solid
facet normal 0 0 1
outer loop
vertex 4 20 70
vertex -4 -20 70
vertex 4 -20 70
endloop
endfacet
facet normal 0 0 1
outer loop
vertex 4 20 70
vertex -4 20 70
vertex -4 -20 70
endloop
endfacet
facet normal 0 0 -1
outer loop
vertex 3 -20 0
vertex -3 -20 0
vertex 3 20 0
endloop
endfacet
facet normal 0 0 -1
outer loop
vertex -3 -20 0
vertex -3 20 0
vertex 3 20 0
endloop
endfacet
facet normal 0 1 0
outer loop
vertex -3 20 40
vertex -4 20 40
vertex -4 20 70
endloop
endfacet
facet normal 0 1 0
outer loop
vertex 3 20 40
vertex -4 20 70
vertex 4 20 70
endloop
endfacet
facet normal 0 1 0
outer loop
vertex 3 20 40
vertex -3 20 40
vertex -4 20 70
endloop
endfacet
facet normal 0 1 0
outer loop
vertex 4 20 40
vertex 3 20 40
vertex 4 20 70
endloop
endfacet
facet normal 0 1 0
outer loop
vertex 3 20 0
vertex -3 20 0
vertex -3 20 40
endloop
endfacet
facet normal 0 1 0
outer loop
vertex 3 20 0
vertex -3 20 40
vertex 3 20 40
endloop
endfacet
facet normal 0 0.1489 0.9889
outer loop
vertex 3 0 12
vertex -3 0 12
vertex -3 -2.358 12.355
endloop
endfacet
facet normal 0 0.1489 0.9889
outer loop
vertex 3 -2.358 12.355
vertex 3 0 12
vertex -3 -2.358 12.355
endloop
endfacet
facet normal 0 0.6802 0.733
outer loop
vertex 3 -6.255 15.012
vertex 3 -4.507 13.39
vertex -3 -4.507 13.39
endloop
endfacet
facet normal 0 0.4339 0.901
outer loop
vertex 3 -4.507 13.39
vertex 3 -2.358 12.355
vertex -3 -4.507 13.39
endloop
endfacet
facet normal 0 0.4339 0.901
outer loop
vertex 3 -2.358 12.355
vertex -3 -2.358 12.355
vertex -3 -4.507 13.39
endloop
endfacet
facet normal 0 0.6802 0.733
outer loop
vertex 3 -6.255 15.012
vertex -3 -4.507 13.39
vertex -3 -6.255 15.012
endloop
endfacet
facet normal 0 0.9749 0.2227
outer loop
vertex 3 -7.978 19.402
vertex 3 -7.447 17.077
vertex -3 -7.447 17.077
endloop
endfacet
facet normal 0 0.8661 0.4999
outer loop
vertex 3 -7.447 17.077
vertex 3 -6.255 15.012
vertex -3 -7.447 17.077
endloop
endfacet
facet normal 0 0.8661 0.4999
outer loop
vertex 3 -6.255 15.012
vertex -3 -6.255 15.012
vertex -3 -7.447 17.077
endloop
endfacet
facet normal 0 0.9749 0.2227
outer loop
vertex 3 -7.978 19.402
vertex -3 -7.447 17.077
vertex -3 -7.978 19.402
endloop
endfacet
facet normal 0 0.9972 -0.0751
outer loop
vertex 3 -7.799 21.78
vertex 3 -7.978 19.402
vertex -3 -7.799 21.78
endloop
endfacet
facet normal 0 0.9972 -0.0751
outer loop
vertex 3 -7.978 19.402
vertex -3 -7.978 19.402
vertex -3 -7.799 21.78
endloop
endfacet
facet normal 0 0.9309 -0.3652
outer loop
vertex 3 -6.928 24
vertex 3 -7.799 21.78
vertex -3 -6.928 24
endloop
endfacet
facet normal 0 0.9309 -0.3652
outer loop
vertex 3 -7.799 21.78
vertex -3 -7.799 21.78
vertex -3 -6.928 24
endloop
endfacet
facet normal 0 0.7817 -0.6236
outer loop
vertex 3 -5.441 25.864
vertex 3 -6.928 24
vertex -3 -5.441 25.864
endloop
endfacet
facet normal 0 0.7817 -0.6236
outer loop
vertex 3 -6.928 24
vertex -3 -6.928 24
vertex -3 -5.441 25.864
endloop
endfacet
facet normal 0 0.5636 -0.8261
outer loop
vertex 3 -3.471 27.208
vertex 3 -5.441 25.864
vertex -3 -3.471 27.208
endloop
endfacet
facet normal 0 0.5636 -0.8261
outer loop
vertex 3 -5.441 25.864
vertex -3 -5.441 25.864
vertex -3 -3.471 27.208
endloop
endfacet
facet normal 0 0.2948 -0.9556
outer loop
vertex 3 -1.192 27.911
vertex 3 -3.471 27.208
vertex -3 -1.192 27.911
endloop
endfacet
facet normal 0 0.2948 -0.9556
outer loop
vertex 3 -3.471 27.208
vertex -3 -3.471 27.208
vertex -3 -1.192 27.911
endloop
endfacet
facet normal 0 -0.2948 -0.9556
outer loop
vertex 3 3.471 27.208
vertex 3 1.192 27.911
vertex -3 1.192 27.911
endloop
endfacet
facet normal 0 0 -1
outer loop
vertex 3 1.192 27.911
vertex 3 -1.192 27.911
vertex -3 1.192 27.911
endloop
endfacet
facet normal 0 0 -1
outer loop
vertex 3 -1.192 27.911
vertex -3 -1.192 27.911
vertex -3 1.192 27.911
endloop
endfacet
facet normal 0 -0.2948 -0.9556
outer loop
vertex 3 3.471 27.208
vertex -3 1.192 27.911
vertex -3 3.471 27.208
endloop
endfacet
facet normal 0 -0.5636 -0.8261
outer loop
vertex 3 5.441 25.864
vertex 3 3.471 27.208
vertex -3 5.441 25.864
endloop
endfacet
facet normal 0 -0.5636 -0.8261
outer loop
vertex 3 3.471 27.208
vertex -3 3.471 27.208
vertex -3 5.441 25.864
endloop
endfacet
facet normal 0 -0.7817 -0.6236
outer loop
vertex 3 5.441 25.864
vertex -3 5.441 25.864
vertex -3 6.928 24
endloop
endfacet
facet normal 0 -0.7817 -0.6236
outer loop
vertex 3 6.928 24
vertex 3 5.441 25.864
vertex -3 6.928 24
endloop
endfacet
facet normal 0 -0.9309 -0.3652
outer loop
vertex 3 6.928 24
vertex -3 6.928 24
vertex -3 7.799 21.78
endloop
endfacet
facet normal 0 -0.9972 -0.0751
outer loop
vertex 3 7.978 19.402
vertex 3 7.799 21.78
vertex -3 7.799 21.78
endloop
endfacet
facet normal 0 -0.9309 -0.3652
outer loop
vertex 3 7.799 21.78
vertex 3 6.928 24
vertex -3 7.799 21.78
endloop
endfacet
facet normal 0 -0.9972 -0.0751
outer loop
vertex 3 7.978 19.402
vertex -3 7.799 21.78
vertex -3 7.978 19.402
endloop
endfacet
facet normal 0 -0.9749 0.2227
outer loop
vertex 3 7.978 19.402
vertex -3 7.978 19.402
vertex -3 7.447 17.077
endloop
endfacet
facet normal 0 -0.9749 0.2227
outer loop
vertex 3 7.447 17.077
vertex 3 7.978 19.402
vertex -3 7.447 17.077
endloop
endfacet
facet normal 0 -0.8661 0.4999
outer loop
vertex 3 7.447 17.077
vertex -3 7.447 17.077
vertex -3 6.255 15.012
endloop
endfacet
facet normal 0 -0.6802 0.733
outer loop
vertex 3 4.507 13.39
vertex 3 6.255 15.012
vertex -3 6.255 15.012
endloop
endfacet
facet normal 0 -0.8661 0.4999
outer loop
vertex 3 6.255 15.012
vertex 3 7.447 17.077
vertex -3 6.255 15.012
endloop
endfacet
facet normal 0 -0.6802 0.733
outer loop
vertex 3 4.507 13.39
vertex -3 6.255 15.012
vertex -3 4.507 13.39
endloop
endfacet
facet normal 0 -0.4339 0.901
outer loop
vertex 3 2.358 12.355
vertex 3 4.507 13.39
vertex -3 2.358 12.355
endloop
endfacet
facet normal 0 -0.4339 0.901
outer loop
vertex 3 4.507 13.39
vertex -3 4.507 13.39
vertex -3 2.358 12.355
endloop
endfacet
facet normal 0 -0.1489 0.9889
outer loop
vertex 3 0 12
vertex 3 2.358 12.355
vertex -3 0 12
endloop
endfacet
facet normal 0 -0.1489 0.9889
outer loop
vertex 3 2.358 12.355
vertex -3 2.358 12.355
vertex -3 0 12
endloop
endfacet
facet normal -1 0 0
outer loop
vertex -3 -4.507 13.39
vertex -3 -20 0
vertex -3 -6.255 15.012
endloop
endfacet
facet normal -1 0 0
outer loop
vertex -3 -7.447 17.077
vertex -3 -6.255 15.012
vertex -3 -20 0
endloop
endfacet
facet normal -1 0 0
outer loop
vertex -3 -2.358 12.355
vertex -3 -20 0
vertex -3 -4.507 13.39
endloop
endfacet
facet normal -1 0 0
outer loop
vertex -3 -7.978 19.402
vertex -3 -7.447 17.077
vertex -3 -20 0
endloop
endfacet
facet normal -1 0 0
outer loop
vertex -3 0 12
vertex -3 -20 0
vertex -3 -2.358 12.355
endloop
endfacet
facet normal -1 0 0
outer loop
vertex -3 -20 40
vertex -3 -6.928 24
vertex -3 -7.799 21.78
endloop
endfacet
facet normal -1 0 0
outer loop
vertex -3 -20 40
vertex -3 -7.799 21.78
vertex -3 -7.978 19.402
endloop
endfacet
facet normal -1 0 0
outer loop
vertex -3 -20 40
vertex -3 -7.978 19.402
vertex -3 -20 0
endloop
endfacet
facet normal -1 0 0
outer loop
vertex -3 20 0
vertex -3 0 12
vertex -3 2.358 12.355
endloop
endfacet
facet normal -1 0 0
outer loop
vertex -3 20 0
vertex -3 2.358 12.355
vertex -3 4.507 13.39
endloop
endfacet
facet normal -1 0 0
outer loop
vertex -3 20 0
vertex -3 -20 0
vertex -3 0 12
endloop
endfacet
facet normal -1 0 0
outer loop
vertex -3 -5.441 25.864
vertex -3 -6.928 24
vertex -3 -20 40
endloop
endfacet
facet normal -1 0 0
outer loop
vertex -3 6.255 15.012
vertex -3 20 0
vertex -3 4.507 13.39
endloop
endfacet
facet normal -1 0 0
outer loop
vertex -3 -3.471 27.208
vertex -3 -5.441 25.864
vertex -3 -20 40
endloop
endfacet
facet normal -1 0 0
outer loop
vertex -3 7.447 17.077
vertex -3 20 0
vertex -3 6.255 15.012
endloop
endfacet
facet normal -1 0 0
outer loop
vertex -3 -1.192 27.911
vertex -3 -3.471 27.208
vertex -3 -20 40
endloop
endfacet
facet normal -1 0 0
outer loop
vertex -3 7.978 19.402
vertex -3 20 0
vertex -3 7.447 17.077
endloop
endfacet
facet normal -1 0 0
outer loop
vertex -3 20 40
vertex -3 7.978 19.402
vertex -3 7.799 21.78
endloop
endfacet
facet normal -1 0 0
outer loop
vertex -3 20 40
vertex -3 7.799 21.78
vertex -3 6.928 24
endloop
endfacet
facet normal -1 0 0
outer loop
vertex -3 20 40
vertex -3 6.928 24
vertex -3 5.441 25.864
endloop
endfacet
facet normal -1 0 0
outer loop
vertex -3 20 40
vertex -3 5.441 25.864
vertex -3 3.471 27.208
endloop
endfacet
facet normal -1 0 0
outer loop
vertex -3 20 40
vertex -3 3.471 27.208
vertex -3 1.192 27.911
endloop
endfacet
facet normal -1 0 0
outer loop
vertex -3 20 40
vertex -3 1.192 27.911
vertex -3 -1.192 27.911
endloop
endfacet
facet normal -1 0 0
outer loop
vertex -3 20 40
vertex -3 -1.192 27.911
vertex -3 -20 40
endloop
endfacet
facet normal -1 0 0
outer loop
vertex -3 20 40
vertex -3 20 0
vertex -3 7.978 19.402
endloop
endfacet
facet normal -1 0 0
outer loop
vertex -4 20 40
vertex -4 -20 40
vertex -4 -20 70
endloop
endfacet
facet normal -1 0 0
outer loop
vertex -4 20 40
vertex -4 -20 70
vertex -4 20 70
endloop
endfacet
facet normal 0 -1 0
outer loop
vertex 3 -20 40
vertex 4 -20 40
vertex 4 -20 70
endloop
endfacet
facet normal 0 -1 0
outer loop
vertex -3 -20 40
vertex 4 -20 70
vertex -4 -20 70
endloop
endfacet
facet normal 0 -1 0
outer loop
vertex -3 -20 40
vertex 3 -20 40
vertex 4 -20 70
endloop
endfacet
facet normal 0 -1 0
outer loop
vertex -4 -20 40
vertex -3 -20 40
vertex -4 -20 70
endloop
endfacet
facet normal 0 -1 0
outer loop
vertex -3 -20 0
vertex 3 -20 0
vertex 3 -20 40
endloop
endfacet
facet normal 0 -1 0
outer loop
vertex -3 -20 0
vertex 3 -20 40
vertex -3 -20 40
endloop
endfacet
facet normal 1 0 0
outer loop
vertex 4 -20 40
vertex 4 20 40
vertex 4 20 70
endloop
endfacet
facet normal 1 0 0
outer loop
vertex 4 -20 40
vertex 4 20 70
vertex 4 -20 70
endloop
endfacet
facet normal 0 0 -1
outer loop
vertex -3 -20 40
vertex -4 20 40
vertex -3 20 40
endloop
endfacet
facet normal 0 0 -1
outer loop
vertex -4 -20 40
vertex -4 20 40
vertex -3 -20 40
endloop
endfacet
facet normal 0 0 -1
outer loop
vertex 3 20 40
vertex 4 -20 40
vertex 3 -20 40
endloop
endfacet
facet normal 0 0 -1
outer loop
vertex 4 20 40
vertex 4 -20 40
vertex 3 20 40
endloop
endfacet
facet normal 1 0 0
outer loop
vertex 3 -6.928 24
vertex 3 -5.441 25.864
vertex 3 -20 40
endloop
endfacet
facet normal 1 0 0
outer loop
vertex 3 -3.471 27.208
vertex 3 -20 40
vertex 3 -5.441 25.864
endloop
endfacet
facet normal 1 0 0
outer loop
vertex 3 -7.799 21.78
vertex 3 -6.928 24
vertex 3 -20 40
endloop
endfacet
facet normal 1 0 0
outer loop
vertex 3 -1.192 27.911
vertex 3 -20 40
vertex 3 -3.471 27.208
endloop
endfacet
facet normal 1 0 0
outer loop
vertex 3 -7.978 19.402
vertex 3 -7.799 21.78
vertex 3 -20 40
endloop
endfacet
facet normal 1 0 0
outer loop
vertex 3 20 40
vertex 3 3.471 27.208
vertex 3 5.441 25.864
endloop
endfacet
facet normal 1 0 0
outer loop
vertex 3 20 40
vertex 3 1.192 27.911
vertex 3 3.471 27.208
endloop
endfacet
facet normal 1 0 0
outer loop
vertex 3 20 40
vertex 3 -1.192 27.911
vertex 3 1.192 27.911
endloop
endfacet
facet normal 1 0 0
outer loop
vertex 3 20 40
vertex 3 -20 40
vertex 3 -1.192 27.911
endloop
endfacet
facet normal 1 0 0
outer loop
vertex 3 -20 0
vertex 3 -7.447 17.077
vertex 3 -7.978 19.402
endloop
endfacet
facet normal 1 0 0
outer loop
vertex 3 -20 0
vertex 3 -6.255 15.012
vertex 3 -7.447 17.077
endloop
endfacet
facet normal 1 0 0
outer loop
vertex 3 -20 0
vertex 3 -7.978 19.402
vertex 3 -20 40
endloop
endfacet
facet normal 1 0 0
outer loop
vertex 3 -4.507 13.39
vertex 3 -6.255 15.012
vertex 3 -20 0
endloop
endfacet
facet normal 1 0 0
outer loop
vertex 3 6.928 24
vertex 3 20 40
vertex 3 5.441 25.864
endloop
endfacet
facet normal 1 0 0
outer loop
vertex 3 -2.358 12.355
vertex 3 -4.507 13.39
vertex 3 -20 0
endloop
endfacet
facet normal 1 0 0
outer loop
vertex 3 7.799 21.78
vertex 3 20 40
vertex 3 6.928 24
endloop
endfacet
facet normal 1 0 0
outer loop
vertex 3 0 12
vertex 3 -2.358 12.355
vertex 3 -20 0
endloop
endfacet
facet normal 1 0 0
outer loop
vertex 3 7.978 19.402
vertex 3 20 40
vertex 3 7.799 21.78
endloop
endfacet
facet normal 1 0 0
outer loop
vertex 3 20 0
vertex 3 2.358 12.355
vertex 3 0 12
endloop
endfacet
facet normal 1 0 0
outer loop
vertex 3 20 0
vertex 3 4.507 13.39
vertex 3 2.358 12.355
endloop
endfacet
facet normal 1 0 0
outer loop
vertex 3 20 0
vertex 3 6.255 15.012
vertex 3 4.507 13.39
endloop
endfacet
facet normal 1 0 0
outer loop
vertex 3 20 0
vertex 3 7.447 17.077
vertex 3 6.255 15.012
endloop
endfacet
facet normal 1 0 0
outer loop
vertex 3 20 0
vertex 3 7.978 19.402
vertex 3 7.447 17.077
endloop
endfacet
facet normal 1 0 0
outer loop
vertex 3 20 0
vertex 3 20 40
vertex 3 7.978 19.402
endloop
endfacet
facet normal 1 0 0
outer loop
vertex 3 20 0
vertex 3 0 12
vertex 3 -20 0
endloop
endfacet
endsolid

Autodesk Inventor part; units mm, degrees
ref_plane "YZ Plane" through (0, 0, 0) normal (1, 0, 0) x (0, 1, 0)
ref_plane "Startebene" through (0, 0, 0) normal (0, 0, 1) x (1, 0, 0)
ref_plane "Endebene" through (0, 0, 70) normal (0, 0, 1) x (1, 0, 0)
sketch "Skizze" plane through (0, 0, 0) normal (0, 0, 1) x (1, 0, 0)
  line L0 (4, -20) -> (-4, -20)
  line L1 (-4, -20) -> (-4, 20)
  line L2 (-4, 20) -> (4, 20)
  line L3 (4, 20) -> (4, -20)
  line L4 (-6, 0) -> (8, 0) construction
  line L5 (0, -30) -> (0, 40) construction
  line L6 (0, 54) -> (0, -44) construction
  line L7 (-9.2, 0) -> (13.2, 0) construction
  dimension "d0" = 40
  dimension "d1" = 8
  dimension "d4" = 4
  dimension "d5" = 20
extrude "Körper" add sketch "Skizze" along normal up to surface (70 mm away) from surface at 0
sketch "Sketch3" plane through (0, 0, 0) normal (0, 0, 1) x (1, 0, 0)
  line L0 (0, 0) -> (10, 0)
ref_plane "Work Plane3" through (0, 0, 0) normal (0, -1, 0) x (1, 0, 0)
sketch "Sketch4" plane through (0, 0, 0) normal (0, -1, 0) x (1, 0, 0)
  line L0 (-2, 0) -> (12, 0)
  line L1 (-2, 70) -> (12, 70)
  dimension "d9" = 70
sketch "Skizze5" plane through (4, -20, 70) normal (1, 0, 0) x (0, 0, -1)
  line L0 (70, 0) -> (0, 0) projected
  line L1 (70, 40) -> (70, 0) projected
  point P0 (70, 20)
  point P1 (50, 20)
  dimension "d11" = 20
  dimension "d19" = 20
hole "Bohrung1" at (4, 0, 20) direction (-1, 0, 0) diameter 16 depth 15 tip angle 118
sketch "Skizze6" plane through (4, -20, 70) normal (1, 0, 0) x (0, 0, -1)
  circle A0 centre (50, 20) radius 8 projected
  line L0 (70, 40) -> (0, 40) projected
  line L1 (70, 0) -> (30, 0)
  line L2 (30, 0) -> (30, 40)
  line L3 (30, 40) -> (70, 40)
  line L4 (70, 40) -> (70, 0)
  point P0 (70, 20)
  dimension "d20" = 40
extrude "Extrusion2" cut sketch "Skizze6" against normal blind 1
sketch "Skizze7" plane through (-4, 20, 0) normal (-1, 0, 0) x (0, 0, 1)
  circle A0 centre (20, -20) radius 8 projected
  line L0 (0, -40) -> (70, -40) projected
  line L1 (0, 0) -> (40, 0)
  line L2 (40, 0) -> (40, -40)
  line L3 (40, -40) -> (0, -40)
  line L4 (0, -40) -> (0, 0)
  point P0 (0, -20)
  dimension "d23" = 40
extrude "Extrusion3" cut sketch "Skizze7" against normal blind 1
equation "\"d0\" = G_W"
equation "\"d1\" = G_H"
equation "\"d4\" = 0.5 * d1"
equation "\"d5\" = 0.5 * d0"
equation "\"d2\" = G_L"
equation "\"G_W\" = 40"
equation "\"G_H\" = 8"
equation "\"G_L\" = d9"
equation "\"G_OFFSET_START\" = 0"
equation "\"G_OFFSET_END\" = 0"
properties part number "EN 10058 - 40 x 6 - 60" material "Stahl, weich"
